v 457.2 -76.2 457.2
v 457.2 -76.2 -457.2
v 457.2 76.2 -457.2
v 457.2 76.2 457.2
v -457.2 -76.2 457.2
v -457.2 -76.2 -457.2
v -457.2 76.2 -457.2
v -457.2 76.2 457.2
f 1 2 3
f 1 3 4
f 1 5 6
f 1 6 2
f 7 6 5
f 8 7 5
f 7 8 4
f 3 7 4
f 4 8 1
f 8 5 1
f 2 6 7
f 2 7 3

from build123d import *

# Parameters (mm, degrees)
F4_W     = 914.4
F4_H     = 914.4
F5_DEPTH = 76.2


with BuildPart() as f5:
    # F4 (on Front) → F5 (new body, symmetric)
    with BuildSketch(Plane.XZ):
        Rectangle(F4_W, F4_H)
    extrude(amount=F5_DEPTH, both=True)


with BuildPart() as f5_1:
    # F6: moved
    add(f5.part)


with BuildPart() as f5_2:
    # F7: moved
    add(f5_1.part)


solid = f5_2.part
